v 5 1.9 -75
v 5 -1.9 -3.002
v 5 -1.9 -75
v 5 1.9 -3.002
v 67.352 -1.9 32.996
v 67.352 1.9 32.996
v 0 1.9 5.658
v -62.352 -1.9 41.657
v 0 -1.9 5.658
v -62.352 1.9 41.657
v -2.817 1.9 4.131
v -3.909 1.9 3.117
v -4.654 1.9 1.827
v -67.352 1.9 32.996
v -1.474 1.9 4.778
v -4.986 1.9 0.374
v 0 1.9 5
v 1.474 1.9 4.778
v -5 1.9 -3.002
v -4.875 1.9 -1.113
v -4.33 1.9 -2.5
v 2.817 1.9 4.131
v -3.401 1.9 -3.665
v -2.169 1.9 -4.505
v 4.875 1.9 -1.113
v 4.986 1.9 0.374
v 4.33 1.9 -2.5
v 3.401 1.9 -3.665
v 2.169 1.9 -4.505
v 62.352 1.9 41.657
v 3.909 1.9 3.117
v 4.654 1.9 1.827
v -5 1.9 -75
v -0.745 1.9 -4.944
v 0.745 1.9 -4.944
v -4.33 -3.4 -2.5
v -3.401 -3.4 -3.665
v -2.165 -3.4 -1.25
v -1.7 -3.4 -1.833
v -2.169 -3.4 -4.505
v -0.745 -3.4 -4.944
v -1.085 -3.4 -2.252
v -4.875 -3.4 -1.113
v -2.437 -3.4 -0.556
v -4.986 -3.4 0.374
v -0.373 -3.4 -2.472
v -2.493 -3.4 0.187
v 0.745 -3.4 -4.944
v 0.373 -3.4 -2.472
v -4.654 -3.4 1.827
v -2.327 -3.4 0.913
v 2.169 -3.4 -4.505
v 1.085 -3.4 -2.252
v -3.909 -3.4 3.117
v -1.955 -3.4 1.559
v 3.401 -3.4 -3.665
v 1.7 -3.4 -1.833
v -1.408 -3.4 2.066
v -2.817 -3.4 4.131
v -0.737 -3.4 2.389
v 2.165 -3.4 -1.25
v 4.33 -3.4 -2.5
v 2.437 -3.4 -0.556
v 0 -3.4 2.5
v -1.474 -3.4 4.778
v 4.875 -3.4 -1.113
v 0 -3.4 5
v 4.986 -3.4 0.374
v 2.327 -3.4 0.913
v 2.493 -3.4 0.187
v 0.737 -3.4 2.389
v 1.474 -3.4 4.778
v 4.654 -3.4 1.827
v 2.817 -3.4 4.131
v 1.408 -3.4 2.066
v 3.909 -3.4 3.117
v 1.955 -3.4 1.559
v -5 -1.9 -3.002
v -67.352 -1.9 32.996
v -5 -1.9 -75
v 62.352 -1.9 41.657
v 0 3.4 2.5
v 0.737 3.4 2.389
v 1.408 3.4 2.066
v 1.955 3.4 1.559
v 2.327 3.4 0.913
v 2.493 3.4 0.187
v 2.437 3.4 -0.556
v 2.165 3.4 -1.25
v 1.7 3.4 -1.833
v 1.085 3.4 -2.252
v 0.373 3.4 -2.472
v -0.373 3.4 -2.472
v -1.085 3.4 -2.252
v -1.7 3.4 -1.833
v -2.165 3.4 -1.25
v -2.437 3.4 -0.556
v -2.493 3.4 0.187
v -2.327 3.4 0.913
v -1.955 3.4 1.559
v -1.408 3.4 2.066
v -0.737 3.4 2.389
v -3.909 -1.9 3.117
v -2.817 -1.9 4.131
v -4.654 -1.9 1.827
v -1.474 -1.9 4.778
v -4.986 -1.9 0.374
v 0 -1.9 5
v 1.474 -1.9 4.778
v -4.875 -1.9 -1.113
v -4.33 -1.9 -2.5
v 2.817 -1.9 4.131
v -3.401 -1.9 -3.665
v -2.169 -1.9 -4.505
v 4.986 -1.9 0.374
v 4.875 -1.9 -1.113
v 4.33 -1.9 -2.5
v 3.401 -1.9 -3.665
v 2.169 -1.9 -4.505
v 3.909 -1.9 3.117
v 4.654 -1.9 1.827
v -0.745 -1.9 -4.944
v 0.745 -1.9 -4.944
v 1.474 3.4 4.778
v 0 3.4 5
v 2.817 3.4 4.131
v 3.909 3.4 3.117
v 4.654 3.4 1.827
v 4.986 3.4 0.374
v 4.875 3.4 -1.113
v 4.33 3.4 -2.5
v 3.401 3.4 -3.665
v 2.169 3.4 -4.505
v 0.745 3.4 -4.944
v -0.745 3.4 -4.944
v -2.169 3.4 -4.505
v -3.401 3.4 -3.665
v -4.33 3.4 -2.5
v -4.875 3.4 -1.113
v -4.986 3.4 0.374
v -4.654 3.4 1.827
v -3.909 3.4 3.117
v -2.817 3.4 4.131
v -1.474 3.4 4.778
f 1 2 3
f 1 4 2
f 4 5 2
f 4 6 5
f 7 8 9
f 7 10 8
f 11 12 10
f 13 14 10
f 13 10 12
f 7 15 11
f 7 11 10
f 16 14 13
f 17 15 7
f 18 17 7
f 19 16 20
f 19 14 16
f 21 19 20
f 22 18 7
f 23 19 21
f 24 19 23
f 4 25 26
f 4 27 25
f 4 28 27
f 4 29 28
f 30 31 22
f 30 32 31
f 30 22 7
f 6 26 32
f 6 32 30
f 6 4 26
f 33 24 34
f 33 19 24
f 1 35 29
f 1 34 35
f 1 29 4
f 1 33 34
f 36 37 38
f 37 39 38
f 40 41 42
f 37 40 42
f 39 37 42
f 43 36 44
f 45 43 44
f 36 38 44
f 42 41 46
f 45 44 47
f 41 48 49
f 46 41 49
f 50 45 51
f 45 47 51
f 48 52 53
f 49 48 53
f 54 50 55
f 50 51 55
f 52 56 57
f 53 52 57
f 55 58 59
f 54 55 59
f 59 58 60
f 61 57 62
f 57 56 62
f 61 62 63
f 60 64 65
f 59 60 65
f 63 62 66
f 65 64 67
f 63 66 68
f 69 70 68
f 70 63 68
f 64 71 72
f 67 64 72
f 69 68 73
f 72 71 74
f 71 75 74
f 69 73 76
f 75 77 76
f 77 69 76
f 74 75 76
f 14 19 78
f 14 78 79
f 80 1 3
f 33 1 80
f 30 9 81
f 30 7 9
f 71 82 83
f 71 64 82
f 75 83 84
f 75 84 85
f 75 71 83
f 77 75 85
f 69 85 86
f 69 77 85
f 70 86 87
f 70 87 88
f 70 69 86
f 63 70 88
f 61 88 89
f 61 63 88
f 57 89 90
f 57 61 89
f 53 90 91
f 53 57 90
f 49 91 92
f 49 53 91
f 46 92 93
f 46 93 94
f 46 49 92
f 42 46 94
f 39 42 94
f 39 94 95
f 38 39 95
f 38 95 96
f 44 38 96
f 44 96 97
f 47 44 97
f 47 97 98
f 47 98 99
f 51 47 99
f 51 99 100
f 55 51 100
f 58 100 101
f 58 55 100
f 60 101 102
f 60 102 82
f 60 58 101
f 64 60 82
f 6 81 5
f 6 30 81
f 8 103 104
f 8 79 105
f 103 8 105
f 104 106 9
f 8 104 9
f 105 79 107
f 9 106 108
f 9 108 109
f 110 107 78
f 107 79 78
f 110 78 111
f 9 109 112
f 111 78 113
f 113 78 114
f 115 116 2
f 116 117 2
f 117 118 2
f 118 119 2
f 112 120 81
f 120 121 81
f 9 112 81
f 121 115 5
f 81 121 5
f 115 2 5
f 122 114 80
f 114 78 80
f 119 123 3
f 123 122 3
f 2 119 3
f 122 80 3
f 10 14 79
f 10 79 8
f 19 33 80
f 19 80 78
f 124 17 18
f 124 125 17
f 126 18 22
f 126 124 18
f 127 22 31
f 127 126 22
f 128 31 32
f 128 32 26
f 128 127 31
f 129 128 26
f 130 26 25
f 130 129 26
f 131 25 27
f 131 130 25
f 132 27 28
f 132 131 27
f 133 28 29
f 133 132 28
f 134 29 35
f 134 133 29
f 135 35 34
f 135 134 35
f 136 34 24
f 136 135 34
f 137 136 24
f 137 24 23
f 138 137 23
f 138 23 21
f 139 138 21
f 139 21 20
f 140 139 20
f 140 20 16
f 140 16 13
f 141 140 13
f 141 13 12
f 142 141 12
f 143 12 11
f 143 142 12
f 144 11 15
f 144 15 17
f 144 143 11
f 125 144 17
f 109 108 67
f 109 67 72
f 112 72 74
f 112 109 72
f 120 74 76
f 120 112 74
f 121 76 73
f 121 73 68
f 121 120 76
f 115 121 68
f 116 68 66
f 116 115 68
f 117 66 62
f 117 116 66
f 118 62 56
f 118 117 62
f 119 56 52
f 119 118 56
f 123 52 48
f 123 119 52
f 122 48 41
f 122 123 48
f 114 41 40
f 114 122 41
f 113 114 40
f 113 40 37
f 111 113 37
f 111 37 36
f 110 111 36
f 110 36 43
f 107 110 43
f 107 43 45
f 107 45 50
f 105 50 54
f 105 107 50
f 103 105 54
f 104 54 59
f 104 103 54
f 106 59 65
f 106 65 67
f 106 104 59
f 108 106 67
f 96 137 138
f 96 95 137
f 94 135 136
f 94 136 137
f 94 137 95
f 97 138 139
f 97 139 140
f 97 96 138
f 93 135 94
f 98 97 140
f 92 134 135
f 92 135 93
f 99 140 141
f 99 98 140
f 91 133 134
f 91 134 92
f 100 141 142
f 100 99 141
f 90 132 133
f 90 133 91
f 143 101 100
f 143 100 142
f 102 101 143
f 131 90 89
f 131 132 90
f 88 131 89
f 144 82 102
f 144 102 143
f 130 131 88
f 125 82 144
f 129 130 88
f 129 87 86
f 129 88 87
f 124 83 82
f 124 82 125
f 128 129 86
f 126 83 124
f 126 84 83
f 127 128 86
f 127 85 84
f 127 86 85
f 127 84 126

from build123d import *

# Parameters (mm, degrees)
SKETCH_1_R      = 5
SKETCH_1_R_2    = 2.5
EXTRUDE_1_DEPTH = 3.4
SKETCH_2_R      = 5
EXTRUDE_2_DEPTH = 1.9


with BuildPart() as part:
    # 草图1 → 凸台-拉伸1 (new, symmetric)
    with BuildSketch(Plane(origin=(0, 0, 0), x_dir=(1, 0, 0), z_dir=(0, 1, 0))):
        with Locations(Location((0, 0, 0), (0, 0, 270))):
            Circle(SKETCH_1_R)
        with Locations(Location((0, 0, 0), (0, 0, 270))):
            Circle(SKETCH_1_R_2, mode=Mode.SUBTRACT)
    extrude(amount=EXTRUDE_1_DEPTH, both=True)

    # 草图2 → 凸台-拉伸2 (add, symmetric)
    with BuildSketch(Plane(origin=(0, 0, 0), x_dir=(1, 0, 0), z_dir=(0, 1, 0))):
        Polygon((5, 3.002496099), (5, 75), (-5, 75), (-5, 3.002496099), (-67.351667387, -32.996255851), (-62.351667387, -41.656509889), (0, -5.657757939), (62.351667387, -41.656509889), (67.351667387, -32.996255851), align=None)
        with Locations(Location((0, 0, 0), (0, 0, 270))):
            Circle(SKETCH_2_R, mode=Mode.SUBTRACT)
    extrude(amount=EXTRUDE_2_DEPTH, both=True)


solid = part.part
